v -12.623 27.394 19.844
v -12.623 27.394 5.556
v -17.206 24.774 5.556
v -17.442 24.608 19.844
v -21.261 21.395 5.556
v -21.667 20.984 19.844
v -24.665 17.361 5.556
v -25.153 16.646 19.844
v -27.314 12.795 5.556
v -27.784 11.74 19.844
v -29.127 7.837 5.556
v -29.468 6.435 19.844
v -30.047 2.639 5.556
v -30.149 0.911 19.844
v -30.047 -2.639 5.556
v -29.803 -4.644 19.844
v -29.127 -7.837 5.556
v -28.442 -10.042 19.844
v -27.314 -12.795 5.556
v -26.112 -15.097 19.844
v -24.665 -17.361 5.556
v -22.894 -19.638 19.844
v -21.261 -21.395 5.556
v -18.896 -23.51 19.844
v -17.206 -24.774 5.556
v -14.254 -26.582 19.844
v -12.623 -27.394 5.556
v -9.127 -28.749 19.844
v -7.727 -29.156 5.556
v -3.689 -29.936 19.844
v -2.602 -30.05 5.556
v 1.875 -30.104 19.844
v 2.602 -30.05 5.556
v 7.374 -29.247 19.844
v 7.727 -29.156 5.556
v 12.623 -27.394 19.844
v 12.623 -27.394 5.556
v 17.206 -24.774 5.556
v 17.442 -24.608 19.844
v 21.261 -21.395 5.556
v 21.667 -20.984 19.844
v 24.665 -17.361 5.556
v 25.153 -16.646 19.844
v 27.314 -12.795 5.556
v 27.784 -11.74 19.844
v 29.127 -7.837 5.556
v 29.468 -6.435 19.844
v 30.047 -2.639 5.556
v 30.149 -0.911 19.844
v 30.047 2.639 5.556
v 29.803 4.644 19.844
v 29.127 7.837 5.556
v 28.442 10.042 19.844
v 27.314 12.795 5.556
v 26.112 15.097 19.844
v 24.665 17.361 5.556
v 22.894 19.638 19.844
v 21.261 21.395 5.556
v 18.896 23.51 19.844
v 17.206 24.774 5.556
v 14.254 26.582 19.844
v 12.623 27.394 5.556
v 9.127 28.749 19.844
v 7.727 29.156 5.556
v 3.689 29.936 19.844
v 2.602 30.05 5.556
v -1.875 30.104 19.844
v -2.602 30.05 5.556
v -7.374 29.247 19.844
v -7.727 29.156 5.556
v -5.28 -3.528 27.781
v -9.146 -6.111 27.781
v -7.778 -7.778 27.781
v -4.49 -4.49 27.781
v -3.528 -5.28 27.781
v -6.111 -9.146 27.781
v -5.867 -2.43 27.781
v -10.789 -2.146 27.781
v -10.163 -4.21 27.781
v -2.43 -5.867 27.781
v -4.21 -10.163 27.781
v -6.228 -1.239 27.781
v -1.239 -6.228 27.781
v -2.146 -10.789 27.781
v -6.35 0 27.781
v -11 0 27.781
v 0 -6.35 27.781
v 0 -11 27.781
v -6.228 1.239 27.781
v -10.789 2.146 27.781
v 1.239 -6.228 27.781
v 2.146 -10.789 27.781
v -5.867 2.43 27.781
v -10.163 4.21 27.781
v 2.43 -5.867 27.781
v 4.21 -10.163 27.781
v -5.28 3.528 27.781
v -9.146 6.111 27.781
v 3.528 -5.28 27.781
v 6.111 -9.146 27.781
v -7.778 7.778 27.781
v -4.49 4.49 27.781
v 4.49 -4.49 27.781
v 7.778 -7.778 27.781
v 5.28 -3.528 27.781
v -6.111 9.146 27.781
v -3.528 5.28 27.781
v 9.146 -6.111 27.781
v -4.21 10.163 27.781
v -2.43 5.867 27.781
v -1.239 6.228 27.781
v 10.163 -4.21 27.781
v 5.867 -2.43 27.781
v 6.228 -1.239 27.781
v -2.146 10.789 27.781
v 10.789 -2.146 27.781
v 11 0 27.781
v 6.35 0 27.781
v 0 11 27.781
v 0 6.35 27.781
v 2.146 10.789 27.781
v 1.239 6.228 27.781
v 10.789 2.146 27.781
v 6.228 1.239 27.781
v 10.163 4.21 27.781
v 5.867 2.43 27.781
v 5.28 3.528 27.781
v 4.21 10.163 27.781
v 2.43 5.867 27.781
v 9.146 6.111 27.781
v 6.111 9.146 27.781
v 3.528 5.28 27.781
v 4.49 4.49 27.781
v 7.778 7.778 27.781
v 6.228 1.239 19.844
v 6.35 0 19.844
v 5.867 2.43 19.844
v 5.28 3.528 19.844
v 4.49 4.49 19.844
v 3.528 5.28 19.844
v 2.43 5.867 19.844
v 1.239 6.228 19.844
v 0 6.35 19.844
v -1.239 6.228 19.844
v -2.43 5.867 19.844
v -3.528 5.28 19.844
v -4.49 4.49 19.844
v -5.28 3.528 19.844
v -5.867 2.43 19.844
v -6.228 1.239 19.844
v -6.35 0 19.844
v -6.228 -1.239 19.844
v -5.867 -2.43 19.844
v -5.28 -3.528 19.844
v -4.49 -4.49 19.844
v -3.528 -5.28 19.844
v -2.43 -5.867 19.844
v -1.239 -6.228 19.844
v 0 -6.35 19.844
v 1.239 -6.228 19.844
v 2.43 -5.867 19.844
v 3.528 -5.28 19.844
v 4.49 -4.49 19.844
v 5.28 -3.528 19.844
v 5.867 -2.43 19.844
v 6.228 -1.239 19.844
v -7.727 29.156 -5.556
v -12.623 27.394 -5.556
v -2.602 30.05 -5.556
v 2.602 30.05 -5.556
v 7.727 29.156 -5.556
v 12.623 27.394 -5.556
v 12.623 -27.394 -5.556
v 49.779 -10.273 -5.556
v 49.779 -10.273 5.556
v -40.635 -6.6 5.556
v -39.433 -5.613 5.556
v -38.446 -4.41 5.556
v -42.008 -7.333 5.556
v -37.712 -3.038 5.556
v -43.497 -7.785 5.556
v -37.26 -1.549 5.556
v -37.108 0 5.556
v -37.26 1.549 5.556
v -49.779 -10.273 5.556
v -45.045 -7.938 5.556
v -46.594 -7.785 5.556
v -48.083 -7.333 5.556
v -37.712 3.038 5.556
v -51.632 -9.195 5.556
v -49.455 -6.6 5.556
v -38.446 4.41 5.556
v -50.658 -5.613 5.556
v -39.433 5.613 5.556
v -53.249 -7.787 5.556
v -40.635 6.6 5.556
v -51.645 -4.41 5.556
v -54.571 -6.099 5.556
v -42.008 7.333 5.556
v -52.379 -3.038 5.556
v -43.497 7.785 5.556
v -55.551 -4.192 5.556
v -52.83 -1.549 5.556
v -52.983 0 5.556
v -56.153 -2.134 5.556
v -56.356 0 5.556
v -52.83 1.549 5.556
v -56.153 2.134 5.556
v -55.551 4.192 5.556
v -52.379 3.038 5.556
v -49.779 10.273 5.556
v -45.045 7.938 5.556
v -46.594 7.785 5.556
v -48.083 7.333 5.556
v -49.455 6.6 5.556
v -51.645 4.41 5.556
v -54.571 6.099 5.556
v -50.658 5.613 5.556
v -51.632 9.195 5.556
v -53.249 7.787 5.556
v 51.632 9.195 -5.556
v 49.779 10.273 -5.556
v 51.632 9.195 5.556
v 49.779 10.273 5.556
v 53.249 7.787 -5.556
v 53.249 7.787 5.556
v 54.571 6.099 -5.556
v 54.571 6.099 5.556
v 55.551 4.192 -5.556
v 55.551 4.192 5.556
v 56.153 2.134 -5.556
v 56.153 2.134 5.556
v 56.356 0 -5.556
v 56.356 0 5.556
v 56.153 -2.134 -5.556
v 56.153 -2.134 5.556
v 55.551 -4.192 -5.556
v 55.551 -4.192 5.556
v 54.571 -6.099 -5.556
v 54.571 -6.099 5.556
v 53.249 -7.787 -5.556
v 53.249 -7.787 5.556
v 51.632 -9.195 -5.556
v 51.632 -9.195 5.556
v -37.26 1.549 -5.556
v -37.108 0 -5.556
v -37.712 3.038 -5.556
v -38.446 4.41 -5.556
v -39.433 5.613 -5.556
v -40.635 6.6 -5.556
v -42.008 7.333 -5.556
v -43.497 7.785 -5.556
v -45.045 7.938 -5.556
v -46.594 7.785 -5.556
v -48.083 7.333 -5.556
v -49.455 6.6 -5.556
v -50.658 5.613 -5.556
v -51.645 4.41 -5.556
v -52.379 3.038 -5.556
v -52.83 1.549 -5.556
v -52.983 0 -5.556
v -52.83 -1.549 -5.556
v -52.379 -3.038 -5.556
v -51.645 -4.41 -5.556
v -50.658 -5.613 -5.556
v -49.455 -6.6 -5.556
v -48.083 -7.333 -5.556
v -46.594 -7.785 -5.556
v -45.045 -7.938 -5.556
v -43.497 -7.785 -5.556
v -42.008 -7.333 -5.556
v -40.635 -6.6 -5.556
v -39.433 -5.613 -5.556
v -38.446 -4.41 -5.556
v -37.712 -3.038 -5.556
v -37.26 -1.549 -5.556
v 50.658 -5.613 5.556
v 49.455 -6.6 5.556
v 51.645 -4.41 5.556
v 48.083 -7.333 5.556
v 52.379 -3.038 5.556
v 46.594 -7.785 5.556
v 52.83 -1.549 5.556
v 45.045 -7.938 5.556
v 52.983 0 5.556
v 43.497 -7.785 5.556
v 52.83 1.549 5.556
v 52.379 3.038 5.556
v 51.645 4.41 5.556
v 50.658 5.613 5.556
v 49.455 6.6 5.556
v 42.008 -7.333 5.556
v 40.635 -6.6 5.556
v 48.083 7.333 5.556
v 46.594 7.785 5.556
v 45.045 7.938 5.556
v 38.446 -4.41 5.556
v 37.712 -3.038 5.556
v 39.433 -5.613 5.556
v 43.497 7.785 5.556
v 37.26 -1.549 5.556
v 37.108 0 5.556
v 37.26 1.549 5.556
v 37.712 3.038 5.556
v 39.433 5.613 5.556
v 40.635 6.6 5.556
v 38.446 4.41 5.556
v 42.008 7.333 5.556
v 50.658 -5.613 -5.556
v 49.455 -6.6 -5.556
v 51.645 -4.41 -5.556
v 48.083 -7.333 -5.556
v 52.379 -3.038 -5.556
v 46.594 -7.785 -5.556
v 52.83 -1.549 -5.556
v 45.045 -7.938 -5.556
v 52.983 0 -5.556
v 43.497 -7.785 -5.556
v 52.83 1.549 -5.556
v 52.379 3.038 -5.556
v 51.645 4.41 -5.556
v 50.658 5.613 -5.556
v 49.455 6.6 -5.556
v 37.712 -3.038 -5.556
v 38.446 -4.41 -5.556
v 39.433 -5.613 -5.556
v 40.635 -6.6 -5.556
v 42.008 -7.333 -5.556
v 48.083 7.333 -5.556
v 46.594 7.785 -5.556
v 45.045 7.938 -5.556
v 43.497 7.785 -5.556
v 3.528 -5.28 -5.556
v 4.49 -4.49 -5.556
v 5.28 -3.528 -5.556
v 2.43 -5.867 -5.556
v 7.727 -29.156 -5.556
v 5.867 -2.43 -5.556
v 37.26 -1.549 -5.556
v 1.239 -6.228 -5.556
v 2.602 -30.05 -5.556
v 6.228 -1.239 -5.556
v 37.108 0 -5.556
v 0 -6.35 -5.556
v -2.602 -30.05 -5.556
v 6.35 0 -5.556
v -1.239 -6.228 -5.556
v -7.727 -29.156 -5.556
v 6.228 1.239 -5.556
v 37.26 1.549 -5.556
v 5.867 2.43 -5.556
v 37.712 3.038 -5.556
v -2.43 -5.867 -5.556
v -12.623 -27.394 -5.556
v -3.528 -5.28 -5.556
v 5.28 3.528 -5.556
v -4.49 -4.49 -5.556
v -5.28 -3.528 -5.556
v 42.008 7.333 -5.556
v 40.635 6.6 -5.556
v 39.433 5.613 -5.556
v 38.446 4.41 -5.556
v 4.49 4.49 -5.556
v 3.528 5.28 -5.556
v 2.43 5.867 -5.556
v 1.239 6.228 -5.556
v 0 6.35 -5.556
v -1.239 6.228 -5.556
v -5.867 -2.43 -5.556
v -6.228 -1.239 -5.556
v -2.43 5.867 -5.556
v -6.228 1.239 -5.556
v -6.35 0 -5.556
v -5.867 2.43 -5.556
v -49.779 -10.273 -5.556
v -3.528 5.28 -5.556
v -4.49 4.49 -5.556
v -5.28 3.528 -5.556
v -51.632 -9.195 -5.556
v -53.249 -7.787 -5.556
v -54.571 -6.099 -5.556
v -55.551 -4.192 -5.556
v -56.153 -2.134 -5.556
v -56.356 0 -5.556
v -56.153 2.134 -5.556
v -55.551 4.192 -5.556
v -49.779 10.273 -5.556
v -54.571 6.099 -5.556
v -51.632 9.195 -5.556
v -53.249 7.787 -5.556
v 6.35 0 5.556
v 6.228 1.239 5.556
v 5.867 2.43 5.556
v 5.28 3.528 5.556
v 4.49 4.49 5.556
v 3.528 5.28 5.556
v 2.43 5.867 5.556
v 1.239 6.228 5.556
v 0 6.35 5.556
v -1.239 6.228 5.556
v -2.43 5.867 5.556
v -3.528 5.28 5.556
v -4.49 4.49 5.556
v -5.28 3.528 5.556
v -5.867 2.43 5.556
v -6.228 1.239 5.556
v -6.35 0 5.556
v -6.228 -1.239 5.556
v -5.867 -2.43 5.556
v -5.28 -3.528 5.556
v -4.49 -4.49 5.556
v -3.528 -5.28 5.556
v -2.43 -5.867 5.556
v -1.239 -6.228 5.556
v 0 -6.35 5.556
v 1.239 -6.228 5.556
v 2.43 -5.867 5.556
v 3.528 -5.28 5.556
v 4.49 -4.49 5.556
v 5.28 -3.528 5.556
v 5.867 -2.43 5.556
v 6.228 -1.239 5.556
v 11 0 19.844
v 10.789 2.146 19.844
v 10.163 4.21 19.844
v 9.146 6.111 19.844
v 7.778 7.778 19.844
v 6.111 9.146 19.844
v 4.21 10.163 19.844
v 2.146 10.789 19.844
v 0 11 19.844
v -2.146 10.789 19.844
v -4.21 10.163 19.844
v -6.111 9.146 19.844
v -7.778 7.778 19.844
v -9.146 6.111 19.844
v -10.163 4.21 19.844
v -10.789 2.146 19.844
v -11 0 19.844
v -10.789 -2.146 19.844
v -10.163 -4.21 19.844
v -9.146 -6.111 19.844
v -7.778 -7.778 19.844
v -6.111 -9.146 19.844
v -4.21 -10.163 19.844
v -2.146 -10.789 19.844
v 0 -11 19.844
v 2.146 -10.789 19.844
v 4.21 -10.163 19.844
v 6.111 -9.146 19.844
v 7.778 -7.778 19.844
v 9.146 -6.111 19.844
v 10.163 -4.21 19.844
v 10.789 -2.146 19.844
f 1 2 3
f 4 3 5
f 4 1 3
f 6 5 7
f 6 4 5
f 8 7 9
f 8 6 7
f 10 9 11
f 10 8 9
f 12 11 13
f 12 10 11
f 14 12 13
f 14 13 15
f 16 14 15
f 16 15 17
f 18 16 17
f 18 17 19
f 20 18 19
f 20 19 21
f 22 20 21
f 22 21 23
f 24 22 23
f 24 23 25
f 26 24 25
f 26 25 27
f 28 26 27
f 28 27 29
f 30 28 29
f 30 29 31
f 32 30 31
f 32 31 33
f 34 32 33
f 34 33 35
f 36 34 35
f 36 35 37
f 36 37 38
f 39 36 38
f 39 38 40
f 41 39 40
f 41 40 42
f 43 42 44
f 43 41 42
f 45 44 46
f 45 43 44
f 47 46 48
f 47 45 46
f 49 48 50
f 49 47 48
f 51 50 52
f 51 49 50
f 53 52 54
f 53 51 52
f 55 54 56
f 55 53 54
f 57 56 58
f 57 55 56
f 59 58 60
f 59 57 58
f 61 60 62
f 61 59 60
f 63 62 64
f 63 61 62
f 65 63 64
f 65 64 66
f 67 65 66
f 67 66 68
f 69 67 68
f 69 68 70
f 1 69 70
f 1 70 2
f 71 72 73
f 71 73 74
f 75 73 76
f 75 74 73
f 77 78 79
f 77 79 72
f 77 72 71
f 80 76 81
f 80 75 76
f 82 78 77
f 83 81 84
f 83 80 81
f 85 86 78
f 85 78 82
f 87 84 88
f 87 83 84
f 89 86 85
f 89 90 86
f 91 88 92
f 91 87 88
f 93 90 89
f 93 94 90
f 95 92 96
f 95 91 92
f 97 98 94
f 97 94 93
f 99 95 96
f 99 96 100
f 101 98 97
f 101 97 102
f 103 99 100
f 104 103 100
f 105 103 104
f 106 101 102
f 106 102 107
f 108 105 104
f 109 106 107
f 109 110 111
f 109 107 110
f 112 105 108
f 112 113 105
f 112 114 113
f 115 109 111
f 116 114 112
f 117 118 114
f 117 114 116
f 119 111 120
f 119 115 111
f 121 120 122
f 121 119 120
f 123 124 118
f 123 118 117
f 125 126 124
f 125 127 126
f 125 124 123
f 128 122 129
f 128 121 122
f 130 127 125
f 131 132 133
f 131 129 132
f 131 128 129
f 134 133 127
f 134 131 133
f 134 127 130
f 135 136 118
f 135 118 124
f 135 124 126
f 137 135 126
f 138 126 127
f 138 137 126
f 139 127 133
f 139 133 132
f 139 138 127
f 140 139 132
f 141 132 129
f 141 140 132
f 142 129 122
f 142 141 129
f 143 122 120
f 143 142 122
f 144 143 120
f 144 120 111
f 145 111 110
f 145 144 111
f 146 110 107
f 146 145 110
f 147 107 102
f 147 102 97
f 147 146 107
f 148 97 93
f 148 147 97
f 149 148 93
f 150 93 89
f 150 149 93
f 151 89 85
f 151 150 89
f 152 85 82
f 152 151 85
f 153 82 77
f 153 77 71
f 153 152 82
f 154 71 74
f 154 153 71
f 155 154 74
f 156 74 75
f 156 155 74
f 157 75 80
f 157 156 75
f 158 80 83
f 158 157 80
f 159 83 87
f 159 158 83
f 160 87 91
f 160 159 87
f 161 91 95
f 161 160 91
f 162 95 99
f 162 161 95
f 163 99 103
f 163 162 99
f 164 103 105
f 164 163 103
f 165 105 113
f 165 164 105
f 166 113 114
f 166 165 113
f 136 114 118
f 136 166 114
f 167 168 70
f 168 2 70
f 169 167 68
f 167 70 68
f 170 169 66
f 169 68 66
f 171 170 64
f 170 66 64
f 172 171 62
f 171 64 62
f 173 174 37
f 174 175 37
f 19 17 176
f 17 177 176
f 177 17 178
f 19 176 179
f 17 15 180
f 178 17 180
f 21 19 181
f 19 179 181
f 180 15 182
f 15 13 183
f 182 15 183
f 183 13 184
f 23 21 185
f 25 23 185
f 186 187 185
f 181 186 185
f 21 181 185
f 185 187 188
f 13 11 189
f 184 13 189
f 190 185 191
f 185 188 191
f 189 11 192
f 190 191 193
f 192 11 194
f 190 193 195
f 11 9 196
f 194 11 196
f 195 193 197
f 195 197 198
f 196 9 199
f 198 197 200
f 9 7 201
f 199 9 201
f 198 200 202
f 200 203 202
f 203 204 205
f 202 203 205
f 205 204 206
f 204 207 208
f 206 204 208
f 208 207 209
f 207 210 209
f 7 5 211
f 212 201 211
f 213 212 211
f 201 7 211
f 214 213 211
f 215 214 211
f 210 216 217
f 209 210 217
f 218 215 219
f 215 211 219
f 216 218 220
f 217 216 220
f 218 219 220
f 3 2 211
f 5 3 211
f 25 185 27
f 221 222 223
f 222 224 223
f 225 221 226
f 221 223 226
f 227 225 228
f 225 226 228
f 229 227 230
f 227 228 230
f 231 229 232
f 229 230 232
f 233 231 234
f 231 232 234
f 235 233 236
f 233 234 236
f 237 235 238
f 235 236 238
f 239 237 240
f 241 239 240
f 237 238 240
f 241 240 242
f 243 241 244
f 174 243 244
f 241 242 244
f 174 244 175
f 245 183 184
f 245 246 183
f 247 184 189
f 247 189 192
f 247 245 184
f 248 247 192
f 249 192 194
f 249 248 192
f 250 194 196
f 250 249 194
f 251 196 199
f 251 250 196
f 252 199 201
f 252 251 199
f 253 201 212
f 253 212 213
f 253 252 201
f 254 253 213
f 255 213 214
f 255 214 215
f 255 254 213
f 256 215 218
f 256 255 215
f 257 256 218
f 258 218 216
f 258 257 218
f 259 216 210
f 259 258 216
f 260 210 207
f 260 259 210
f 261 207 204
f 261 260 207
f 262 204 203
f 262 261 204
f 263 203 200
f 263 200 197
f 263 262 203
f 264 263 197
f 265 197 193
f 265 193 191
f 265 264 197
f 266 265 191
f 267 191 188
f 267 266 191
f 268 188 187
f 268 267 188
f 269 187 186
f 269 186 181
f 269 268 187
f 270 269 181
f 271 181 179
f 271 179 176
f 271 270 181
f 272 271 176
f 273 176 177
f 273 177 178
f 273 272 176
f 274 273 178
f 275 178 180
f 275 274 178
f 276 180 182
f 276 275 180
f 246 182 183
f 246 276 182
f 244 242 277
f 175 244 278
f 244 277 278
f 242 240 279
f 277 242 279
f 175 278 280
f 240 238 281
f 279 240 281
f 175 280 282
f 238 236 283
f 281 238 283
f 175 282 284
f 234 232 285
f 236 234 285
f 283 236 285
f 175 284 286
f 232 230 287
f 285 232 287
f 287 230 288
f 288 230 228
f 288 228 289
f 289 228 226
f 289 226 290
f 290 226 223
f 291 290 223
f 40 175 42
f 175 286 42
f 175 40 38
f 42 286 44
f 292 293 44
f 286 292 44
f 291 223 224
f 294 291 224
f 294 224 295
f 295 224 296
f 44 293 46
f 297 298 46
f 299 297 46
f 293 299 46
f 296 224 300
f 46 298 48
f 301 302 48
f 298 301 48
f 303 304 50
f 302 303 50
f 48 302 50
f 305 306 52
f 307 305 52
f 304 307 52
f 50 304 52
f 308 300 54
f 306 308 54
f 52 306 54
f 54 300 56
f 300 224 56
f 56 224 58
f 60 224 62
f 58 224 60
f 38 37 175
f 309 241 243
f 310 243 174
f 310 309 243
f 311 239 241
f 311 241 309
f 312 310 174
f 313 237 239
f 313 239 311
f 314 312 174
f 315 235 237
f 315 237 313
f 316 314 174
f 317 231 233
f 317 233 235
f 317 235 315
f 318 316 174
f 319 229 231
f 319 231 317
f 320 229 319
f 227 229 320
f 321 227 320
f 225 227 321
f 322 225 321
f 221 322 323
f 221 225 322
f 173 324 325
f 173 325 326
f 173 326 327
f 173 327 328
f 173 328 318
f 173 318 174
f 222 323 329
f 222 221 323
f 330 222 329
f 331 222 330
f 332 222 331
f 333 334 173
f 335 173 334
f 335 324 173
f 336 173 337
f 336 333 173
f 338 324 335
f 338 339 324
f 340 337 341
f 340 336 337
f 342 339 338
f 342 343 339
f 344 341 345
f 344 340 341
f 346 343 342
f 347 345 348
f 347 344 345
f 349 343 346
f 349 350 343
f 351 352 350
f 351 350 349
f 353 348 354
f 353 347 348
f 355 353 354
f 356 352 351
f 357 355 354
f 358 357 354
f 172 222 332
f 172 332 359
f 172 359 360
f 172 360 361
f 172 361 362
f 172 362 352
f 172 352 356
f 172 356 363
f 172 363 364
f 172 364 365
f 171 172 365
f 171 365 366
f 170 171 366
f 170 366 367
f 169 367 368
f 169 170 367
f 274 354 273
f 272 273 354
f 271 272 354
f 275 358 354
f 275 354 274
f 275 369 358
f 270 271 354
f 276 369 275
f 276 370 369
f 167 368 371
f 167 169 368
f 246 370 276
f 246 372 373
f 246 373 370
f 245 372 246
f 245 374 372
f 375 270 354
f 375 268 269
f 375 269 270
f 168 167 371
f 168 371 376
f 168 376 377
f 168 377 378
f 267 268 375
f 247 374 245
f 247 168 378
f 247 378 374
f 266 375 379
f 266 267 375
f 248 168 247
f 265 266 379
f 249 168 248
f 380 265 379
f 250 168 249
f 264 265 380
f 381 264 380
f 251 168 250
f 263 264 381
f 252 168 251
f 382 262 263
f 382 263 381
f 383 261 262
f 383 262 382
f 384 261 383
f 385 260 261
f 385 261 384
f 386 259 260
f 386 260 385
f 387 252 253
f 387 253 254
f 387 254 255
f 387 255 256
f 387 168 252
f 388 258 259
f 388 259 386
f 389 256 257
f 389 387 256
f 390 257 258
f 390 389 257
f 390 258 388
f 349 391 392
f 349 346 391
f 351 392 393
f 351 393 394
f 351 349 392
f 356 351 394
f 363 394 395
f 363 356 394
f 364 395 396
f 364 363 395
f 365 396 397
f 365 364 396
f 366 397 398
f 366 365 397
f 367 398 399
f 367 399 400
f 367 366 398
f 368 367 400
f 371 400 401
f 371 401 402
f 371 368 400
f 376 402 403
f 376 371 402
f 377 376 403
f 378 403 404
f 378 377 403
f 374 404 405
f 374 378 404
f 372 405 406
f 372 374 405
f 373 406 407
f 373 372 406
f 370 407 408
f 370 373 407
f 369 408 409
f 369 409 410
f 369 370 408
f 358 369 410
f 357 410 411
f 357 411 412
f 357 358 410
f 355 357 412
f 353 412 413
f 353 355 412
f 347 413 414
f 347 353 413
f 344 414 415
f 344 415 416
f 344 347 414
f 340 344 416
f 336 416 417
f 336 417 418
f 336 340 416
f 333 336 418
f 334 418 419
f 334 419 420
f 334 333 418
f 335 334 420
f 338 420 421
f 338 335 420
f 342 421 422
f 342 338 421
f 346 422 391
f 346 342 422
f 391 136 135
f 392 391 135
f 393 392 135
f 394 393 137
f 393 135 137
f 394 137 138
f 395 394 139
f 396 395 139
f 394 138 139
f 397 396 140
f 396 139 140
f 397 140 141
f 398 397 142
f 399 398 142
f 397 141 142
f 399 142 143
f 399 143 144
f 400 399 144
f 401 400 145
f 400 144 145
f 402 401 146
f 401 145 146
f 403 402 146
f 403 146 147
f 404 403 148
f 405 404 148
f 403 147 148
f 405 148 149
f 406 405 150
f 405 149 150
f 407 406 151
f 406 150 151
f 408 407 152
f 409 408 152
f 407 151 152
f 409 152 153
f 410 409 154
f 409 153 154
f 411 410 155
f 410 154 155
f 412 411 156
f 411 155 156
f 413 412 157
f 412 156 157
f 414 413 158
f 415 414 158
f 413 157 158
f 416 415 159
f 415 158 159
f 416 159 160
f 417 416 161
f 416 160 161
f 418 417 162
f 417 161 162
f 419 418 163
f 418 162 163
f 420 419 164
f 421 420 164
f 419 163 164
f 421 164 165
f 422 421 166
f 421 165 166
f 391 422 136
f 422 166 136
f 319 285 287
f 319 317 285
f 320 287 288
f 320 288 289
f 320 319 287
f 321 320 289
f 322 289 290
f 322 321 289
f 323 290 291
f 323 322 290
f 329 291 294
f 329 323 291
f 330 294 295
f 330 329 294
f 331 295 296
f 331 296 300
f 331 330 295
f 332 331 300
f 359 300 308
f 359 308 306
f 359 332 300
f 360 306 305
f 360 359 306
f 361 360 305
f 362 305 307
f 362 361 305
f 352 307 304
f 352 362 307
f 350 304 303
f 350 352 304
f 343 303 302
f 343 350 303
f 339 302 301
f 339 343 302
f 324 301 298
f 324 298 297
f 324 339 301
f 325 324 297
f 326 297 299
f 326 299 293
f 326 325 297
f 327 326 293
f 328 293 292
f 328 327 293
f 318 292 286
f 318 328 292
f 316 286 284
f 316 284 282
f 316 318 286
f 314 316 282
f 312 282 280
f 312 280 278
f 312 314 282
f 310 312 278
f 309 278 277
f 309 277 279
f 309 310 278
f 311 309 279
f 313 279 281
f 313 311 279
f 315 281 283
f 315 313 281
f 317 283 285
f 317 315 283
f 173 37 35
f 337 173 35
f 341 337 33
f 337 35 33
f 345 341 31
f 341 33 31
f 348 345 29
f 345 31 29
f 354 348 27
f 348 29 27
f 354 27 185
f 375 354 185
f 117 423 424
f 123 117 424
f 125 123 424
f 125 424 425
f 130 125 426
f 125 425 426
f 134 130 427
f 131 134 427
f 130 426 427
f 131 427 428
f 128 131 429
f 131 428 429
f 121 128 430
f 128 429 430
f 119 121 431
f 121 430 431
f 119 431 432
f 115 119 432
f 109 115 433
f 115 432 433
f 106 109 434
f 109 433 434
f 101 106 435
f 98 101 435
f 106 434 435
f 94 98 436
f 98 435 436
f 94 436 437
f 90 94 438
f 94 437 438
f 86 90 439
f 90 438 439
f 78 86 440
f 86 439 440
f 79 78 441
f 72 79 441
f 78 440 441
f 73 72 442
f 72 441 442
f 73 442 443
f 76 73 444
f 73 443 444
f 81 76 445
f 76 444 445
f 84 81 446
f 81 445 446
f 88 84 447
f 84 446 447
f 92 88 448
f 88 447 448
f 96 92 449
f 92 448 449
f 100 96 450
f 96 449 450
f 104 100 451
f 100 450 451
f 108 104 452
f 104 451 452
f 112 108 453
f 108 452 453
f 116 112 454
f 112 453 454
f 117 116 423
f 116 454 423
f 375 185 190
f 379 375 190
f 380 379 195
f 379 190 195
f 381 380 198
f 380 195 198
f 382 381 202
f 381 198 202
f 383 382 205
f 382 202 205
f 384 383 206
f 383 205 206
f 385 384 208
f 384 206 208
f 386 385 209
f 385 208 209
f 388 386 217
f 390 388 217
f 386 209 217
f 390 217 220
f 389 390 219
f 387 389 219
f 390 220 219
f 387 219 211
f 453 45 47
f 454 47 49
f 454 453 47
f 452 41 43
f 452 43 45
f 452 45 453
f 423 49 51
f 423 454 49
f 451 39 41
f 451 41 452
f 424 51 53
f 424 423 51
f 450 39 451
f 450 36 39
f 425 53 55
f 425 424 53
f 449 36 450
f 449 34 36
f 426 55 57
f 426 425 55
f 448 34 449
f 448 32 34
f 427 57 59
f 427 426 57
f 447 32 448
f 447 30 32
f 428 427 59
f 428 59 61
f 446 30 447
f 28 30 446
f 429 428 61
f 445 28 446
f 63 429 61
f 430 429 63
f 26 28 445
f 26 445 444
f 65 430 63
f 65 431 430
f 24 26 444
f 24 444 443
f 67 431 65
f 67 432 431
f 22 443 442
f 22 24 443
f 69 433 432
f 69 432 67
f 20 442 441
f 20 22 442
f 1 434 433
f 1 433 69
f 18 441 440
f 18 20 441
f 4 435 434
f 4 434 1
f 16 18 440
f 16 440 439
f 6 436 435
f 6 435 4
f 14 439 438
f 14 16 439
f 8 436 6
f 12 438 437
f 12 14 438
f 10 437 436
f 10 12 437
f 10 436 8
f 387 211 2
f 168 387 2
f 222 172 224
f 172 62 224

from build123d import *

# Parameters (mm, degrees)
SKETCH1_R           = 7.9375
SKETCH1_R_2         = 6.35
BOSS_EXTRUDE1_DEPTH = 5.55625
BOSS_EXTRUDE2_START = 14.2875
SKETCH2_R           = 6.35
BOSS_EXTRUDE2_DEPTH = 14.2875
SKETCH3_R           = 11
SKETCH3_R_2         = 6.35
BOSS_EXTRUDE3_DEPTH = 7.9375


with BuildPart() as part:
    # Sketch1 → Boss-Extrude1 (new, symmetric)
    with BuildSketch(Plane.XY):
        with BuildLine():
            Line((-12.623072687, 27.39405852), (-49.778964758, 10.272771945))
            ThreePointArc((-49.778964758, 10.272771945), (-56.35625, 0), (-49.778964758, -10.272771945))
            Line((-49.778964758, -10.272771945), (-12.623072687, -27.39405852))
            ThreePointArc((-12.623072687, -27.39405852), (0, -30.1625), (12.623072687, -27.39405852))
            Line((12.623072687, -27.39405852), (49.778964758, -10.272771945))
            ThreePointArc((49.778964758, -10.272771945), (56.35625, 0), (49.778964758, 10.272771945))
            Line((49.778964758, 10.272771945), (12.623072687, 27.39405852))
            ThreePointArc((12.623072687, 27.39405852), (0, 30.1625), (-12.623072687, 27.39405852))
        make_face()
        with Locations((-45.0453125, 0)):
            Circle(SKETCH1_R, mode=Mode.SUBTRACT)
        Circle(SKETCH1_R_2, mode=Mode.SUBTRACT)
        with Locations((45.0453125, 0)):
            Circle(SKETCH1_R, mode=Mode.SUBTRACT)
    extrude(amount=BOSS_EXTRUDE1_DEPTH, both=True)

    # Sketch2 → Boss-Extrude2 (add)
    with BuildSketch(Plane.XY.offset(5.55625).offset(BOSS_EXTRUDE2_START)):
        with BuildLine():
            ThreePointArc((-12.623072687, 27.39405852), (-16.263962868, -25.401966815), (30.1625, 0))
            ThreePointArc((30.1625, 0), (25.401966815, 16.263962868), (12.623072687, 27.39405852))
            ThreePointArc((12.623072687, 27.39405852), (0, 30.1625), (-12.623072687, 27.39405852))
        make_face()
        Circle(SKETCH2_R, mode=Mode.SUBTRACT)
    extrude(amount=-BOSS_EXTRUDE2_DEPTH)

    # Sketch3 → Boss-Extrude3 (add)
    with BuildSketch(Plane.XY.offset(19.84375)):
        Circle(SKETCH3_R)
        Circle(SKETCH3_R_2, mode=Mode.SUBTRACT)
    extrude(amount=BOSS_EXTRUDE3_DEPTH)


solid = part.part
